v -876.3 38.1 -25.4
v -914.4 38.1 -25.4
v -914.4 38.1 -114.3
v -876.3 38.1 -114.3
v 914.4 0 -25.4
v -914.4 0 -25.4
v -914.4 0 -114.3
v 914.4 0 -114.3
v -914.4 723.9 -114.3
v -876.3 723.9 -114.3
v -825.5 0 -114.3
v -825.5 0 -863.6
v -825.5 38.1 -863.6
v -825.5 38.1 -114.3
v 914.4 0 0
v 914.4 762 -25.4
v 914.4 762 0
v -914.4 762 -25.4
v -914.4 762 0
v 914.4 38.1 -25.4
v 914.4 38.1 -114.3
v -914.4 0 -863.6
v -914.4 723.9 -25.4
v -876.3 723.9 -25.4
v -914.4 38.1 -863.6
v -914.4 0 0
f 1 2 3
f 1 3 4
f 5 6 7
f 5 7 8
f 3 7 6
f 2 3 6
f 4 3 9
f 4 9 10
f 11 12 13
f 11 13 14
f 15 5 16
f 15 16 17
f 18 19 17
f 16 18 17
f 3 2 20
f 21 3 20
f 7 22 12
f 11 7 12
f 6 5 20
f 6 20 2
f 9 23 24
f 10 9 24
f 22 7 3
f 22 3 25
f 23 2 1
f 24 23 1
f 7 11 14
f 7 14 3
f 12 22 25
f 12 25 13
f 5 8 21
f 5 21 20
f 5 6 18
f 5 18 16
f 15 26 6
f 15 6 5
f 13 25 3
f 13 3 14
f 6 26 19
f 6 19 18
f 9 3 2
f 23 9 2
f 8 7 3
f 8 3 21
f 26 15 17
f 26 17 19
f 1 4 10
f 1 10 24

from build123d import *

# Parameters (mm, degrees)
F1_DEPTH = 762
F2_DEPTH = 38.1
F0_W     = 38.1
F0_H     = 88.9
F3_DEPTH = 685.8
F0_W_2   = 50.8
F5_DEPTH = 38.1


with BuildPart() as f1:
    # F0 (on Front) → F1 (new body)
    with BuildSketch(Plane.XZ):
        Polygon((914.4, 0), (0, 0), (-914.4, 0), (-914.4, -25.4), (-876.3, -25.4), (-825.5, -25.4), (0, -25.4), (825.5, -25.4), (876.3, -25.4), (914.4, -25.4), align=None)
    extrude(amount=-F1_DEPTH)


with BuildPart() as f2:
    # F0 (on Front) → F2 (new body)
    with BuildSketch(Plane.XZ):
        Polygon((-876.3, -114.3), (-914.4, -114.3), (-914.4, -863.6), (-825.5, -863.6), (-825.5, -114.3), align=None)
    extrude(amount=-F2_DEPTH)


with BuildPart() as f3:
    # F0 (on Front) → F3 (new body)
    with BuildSketch(Plane.XZ):
        with Locations((-895.35, -69.85)):
            Rectangle(F0_W, F0_H)
    extrude(amount=-F3_DEPTH)


with BuildPart() as f3_1:
    # F4: moved
    add(f3.part.moved(Location((0, 38.1, 0))))


with BuildPart() as f5:
    # F0 (on Front) → F5 (new body)
    with BuildSketch(Plane.XZ):
        Polygon((0, -25.4), (-825.5, -25.4), (-825.5, -114.3), (0, -114.3), (825.5, -114.3), (825.5, -25.4), align=None)
        with Locations((-850.9, -69.85)):
            Rectangle(F0_W_2, F0_H)
        with Locations((-895.35, -69.85)):
            Rectangle(F0_W, F0_H)
        with Locations((850.9, -69.85)):
            Rectangle(F0_W_2, F0_H)
        with Locations((895.35, -69.85)):
            Rectangle(F0_W, F0_H)
    extrude(amount=-F5_DEPTH)


solid = Compound([f1.part, f2.part, f3_1.part, f5.part])
